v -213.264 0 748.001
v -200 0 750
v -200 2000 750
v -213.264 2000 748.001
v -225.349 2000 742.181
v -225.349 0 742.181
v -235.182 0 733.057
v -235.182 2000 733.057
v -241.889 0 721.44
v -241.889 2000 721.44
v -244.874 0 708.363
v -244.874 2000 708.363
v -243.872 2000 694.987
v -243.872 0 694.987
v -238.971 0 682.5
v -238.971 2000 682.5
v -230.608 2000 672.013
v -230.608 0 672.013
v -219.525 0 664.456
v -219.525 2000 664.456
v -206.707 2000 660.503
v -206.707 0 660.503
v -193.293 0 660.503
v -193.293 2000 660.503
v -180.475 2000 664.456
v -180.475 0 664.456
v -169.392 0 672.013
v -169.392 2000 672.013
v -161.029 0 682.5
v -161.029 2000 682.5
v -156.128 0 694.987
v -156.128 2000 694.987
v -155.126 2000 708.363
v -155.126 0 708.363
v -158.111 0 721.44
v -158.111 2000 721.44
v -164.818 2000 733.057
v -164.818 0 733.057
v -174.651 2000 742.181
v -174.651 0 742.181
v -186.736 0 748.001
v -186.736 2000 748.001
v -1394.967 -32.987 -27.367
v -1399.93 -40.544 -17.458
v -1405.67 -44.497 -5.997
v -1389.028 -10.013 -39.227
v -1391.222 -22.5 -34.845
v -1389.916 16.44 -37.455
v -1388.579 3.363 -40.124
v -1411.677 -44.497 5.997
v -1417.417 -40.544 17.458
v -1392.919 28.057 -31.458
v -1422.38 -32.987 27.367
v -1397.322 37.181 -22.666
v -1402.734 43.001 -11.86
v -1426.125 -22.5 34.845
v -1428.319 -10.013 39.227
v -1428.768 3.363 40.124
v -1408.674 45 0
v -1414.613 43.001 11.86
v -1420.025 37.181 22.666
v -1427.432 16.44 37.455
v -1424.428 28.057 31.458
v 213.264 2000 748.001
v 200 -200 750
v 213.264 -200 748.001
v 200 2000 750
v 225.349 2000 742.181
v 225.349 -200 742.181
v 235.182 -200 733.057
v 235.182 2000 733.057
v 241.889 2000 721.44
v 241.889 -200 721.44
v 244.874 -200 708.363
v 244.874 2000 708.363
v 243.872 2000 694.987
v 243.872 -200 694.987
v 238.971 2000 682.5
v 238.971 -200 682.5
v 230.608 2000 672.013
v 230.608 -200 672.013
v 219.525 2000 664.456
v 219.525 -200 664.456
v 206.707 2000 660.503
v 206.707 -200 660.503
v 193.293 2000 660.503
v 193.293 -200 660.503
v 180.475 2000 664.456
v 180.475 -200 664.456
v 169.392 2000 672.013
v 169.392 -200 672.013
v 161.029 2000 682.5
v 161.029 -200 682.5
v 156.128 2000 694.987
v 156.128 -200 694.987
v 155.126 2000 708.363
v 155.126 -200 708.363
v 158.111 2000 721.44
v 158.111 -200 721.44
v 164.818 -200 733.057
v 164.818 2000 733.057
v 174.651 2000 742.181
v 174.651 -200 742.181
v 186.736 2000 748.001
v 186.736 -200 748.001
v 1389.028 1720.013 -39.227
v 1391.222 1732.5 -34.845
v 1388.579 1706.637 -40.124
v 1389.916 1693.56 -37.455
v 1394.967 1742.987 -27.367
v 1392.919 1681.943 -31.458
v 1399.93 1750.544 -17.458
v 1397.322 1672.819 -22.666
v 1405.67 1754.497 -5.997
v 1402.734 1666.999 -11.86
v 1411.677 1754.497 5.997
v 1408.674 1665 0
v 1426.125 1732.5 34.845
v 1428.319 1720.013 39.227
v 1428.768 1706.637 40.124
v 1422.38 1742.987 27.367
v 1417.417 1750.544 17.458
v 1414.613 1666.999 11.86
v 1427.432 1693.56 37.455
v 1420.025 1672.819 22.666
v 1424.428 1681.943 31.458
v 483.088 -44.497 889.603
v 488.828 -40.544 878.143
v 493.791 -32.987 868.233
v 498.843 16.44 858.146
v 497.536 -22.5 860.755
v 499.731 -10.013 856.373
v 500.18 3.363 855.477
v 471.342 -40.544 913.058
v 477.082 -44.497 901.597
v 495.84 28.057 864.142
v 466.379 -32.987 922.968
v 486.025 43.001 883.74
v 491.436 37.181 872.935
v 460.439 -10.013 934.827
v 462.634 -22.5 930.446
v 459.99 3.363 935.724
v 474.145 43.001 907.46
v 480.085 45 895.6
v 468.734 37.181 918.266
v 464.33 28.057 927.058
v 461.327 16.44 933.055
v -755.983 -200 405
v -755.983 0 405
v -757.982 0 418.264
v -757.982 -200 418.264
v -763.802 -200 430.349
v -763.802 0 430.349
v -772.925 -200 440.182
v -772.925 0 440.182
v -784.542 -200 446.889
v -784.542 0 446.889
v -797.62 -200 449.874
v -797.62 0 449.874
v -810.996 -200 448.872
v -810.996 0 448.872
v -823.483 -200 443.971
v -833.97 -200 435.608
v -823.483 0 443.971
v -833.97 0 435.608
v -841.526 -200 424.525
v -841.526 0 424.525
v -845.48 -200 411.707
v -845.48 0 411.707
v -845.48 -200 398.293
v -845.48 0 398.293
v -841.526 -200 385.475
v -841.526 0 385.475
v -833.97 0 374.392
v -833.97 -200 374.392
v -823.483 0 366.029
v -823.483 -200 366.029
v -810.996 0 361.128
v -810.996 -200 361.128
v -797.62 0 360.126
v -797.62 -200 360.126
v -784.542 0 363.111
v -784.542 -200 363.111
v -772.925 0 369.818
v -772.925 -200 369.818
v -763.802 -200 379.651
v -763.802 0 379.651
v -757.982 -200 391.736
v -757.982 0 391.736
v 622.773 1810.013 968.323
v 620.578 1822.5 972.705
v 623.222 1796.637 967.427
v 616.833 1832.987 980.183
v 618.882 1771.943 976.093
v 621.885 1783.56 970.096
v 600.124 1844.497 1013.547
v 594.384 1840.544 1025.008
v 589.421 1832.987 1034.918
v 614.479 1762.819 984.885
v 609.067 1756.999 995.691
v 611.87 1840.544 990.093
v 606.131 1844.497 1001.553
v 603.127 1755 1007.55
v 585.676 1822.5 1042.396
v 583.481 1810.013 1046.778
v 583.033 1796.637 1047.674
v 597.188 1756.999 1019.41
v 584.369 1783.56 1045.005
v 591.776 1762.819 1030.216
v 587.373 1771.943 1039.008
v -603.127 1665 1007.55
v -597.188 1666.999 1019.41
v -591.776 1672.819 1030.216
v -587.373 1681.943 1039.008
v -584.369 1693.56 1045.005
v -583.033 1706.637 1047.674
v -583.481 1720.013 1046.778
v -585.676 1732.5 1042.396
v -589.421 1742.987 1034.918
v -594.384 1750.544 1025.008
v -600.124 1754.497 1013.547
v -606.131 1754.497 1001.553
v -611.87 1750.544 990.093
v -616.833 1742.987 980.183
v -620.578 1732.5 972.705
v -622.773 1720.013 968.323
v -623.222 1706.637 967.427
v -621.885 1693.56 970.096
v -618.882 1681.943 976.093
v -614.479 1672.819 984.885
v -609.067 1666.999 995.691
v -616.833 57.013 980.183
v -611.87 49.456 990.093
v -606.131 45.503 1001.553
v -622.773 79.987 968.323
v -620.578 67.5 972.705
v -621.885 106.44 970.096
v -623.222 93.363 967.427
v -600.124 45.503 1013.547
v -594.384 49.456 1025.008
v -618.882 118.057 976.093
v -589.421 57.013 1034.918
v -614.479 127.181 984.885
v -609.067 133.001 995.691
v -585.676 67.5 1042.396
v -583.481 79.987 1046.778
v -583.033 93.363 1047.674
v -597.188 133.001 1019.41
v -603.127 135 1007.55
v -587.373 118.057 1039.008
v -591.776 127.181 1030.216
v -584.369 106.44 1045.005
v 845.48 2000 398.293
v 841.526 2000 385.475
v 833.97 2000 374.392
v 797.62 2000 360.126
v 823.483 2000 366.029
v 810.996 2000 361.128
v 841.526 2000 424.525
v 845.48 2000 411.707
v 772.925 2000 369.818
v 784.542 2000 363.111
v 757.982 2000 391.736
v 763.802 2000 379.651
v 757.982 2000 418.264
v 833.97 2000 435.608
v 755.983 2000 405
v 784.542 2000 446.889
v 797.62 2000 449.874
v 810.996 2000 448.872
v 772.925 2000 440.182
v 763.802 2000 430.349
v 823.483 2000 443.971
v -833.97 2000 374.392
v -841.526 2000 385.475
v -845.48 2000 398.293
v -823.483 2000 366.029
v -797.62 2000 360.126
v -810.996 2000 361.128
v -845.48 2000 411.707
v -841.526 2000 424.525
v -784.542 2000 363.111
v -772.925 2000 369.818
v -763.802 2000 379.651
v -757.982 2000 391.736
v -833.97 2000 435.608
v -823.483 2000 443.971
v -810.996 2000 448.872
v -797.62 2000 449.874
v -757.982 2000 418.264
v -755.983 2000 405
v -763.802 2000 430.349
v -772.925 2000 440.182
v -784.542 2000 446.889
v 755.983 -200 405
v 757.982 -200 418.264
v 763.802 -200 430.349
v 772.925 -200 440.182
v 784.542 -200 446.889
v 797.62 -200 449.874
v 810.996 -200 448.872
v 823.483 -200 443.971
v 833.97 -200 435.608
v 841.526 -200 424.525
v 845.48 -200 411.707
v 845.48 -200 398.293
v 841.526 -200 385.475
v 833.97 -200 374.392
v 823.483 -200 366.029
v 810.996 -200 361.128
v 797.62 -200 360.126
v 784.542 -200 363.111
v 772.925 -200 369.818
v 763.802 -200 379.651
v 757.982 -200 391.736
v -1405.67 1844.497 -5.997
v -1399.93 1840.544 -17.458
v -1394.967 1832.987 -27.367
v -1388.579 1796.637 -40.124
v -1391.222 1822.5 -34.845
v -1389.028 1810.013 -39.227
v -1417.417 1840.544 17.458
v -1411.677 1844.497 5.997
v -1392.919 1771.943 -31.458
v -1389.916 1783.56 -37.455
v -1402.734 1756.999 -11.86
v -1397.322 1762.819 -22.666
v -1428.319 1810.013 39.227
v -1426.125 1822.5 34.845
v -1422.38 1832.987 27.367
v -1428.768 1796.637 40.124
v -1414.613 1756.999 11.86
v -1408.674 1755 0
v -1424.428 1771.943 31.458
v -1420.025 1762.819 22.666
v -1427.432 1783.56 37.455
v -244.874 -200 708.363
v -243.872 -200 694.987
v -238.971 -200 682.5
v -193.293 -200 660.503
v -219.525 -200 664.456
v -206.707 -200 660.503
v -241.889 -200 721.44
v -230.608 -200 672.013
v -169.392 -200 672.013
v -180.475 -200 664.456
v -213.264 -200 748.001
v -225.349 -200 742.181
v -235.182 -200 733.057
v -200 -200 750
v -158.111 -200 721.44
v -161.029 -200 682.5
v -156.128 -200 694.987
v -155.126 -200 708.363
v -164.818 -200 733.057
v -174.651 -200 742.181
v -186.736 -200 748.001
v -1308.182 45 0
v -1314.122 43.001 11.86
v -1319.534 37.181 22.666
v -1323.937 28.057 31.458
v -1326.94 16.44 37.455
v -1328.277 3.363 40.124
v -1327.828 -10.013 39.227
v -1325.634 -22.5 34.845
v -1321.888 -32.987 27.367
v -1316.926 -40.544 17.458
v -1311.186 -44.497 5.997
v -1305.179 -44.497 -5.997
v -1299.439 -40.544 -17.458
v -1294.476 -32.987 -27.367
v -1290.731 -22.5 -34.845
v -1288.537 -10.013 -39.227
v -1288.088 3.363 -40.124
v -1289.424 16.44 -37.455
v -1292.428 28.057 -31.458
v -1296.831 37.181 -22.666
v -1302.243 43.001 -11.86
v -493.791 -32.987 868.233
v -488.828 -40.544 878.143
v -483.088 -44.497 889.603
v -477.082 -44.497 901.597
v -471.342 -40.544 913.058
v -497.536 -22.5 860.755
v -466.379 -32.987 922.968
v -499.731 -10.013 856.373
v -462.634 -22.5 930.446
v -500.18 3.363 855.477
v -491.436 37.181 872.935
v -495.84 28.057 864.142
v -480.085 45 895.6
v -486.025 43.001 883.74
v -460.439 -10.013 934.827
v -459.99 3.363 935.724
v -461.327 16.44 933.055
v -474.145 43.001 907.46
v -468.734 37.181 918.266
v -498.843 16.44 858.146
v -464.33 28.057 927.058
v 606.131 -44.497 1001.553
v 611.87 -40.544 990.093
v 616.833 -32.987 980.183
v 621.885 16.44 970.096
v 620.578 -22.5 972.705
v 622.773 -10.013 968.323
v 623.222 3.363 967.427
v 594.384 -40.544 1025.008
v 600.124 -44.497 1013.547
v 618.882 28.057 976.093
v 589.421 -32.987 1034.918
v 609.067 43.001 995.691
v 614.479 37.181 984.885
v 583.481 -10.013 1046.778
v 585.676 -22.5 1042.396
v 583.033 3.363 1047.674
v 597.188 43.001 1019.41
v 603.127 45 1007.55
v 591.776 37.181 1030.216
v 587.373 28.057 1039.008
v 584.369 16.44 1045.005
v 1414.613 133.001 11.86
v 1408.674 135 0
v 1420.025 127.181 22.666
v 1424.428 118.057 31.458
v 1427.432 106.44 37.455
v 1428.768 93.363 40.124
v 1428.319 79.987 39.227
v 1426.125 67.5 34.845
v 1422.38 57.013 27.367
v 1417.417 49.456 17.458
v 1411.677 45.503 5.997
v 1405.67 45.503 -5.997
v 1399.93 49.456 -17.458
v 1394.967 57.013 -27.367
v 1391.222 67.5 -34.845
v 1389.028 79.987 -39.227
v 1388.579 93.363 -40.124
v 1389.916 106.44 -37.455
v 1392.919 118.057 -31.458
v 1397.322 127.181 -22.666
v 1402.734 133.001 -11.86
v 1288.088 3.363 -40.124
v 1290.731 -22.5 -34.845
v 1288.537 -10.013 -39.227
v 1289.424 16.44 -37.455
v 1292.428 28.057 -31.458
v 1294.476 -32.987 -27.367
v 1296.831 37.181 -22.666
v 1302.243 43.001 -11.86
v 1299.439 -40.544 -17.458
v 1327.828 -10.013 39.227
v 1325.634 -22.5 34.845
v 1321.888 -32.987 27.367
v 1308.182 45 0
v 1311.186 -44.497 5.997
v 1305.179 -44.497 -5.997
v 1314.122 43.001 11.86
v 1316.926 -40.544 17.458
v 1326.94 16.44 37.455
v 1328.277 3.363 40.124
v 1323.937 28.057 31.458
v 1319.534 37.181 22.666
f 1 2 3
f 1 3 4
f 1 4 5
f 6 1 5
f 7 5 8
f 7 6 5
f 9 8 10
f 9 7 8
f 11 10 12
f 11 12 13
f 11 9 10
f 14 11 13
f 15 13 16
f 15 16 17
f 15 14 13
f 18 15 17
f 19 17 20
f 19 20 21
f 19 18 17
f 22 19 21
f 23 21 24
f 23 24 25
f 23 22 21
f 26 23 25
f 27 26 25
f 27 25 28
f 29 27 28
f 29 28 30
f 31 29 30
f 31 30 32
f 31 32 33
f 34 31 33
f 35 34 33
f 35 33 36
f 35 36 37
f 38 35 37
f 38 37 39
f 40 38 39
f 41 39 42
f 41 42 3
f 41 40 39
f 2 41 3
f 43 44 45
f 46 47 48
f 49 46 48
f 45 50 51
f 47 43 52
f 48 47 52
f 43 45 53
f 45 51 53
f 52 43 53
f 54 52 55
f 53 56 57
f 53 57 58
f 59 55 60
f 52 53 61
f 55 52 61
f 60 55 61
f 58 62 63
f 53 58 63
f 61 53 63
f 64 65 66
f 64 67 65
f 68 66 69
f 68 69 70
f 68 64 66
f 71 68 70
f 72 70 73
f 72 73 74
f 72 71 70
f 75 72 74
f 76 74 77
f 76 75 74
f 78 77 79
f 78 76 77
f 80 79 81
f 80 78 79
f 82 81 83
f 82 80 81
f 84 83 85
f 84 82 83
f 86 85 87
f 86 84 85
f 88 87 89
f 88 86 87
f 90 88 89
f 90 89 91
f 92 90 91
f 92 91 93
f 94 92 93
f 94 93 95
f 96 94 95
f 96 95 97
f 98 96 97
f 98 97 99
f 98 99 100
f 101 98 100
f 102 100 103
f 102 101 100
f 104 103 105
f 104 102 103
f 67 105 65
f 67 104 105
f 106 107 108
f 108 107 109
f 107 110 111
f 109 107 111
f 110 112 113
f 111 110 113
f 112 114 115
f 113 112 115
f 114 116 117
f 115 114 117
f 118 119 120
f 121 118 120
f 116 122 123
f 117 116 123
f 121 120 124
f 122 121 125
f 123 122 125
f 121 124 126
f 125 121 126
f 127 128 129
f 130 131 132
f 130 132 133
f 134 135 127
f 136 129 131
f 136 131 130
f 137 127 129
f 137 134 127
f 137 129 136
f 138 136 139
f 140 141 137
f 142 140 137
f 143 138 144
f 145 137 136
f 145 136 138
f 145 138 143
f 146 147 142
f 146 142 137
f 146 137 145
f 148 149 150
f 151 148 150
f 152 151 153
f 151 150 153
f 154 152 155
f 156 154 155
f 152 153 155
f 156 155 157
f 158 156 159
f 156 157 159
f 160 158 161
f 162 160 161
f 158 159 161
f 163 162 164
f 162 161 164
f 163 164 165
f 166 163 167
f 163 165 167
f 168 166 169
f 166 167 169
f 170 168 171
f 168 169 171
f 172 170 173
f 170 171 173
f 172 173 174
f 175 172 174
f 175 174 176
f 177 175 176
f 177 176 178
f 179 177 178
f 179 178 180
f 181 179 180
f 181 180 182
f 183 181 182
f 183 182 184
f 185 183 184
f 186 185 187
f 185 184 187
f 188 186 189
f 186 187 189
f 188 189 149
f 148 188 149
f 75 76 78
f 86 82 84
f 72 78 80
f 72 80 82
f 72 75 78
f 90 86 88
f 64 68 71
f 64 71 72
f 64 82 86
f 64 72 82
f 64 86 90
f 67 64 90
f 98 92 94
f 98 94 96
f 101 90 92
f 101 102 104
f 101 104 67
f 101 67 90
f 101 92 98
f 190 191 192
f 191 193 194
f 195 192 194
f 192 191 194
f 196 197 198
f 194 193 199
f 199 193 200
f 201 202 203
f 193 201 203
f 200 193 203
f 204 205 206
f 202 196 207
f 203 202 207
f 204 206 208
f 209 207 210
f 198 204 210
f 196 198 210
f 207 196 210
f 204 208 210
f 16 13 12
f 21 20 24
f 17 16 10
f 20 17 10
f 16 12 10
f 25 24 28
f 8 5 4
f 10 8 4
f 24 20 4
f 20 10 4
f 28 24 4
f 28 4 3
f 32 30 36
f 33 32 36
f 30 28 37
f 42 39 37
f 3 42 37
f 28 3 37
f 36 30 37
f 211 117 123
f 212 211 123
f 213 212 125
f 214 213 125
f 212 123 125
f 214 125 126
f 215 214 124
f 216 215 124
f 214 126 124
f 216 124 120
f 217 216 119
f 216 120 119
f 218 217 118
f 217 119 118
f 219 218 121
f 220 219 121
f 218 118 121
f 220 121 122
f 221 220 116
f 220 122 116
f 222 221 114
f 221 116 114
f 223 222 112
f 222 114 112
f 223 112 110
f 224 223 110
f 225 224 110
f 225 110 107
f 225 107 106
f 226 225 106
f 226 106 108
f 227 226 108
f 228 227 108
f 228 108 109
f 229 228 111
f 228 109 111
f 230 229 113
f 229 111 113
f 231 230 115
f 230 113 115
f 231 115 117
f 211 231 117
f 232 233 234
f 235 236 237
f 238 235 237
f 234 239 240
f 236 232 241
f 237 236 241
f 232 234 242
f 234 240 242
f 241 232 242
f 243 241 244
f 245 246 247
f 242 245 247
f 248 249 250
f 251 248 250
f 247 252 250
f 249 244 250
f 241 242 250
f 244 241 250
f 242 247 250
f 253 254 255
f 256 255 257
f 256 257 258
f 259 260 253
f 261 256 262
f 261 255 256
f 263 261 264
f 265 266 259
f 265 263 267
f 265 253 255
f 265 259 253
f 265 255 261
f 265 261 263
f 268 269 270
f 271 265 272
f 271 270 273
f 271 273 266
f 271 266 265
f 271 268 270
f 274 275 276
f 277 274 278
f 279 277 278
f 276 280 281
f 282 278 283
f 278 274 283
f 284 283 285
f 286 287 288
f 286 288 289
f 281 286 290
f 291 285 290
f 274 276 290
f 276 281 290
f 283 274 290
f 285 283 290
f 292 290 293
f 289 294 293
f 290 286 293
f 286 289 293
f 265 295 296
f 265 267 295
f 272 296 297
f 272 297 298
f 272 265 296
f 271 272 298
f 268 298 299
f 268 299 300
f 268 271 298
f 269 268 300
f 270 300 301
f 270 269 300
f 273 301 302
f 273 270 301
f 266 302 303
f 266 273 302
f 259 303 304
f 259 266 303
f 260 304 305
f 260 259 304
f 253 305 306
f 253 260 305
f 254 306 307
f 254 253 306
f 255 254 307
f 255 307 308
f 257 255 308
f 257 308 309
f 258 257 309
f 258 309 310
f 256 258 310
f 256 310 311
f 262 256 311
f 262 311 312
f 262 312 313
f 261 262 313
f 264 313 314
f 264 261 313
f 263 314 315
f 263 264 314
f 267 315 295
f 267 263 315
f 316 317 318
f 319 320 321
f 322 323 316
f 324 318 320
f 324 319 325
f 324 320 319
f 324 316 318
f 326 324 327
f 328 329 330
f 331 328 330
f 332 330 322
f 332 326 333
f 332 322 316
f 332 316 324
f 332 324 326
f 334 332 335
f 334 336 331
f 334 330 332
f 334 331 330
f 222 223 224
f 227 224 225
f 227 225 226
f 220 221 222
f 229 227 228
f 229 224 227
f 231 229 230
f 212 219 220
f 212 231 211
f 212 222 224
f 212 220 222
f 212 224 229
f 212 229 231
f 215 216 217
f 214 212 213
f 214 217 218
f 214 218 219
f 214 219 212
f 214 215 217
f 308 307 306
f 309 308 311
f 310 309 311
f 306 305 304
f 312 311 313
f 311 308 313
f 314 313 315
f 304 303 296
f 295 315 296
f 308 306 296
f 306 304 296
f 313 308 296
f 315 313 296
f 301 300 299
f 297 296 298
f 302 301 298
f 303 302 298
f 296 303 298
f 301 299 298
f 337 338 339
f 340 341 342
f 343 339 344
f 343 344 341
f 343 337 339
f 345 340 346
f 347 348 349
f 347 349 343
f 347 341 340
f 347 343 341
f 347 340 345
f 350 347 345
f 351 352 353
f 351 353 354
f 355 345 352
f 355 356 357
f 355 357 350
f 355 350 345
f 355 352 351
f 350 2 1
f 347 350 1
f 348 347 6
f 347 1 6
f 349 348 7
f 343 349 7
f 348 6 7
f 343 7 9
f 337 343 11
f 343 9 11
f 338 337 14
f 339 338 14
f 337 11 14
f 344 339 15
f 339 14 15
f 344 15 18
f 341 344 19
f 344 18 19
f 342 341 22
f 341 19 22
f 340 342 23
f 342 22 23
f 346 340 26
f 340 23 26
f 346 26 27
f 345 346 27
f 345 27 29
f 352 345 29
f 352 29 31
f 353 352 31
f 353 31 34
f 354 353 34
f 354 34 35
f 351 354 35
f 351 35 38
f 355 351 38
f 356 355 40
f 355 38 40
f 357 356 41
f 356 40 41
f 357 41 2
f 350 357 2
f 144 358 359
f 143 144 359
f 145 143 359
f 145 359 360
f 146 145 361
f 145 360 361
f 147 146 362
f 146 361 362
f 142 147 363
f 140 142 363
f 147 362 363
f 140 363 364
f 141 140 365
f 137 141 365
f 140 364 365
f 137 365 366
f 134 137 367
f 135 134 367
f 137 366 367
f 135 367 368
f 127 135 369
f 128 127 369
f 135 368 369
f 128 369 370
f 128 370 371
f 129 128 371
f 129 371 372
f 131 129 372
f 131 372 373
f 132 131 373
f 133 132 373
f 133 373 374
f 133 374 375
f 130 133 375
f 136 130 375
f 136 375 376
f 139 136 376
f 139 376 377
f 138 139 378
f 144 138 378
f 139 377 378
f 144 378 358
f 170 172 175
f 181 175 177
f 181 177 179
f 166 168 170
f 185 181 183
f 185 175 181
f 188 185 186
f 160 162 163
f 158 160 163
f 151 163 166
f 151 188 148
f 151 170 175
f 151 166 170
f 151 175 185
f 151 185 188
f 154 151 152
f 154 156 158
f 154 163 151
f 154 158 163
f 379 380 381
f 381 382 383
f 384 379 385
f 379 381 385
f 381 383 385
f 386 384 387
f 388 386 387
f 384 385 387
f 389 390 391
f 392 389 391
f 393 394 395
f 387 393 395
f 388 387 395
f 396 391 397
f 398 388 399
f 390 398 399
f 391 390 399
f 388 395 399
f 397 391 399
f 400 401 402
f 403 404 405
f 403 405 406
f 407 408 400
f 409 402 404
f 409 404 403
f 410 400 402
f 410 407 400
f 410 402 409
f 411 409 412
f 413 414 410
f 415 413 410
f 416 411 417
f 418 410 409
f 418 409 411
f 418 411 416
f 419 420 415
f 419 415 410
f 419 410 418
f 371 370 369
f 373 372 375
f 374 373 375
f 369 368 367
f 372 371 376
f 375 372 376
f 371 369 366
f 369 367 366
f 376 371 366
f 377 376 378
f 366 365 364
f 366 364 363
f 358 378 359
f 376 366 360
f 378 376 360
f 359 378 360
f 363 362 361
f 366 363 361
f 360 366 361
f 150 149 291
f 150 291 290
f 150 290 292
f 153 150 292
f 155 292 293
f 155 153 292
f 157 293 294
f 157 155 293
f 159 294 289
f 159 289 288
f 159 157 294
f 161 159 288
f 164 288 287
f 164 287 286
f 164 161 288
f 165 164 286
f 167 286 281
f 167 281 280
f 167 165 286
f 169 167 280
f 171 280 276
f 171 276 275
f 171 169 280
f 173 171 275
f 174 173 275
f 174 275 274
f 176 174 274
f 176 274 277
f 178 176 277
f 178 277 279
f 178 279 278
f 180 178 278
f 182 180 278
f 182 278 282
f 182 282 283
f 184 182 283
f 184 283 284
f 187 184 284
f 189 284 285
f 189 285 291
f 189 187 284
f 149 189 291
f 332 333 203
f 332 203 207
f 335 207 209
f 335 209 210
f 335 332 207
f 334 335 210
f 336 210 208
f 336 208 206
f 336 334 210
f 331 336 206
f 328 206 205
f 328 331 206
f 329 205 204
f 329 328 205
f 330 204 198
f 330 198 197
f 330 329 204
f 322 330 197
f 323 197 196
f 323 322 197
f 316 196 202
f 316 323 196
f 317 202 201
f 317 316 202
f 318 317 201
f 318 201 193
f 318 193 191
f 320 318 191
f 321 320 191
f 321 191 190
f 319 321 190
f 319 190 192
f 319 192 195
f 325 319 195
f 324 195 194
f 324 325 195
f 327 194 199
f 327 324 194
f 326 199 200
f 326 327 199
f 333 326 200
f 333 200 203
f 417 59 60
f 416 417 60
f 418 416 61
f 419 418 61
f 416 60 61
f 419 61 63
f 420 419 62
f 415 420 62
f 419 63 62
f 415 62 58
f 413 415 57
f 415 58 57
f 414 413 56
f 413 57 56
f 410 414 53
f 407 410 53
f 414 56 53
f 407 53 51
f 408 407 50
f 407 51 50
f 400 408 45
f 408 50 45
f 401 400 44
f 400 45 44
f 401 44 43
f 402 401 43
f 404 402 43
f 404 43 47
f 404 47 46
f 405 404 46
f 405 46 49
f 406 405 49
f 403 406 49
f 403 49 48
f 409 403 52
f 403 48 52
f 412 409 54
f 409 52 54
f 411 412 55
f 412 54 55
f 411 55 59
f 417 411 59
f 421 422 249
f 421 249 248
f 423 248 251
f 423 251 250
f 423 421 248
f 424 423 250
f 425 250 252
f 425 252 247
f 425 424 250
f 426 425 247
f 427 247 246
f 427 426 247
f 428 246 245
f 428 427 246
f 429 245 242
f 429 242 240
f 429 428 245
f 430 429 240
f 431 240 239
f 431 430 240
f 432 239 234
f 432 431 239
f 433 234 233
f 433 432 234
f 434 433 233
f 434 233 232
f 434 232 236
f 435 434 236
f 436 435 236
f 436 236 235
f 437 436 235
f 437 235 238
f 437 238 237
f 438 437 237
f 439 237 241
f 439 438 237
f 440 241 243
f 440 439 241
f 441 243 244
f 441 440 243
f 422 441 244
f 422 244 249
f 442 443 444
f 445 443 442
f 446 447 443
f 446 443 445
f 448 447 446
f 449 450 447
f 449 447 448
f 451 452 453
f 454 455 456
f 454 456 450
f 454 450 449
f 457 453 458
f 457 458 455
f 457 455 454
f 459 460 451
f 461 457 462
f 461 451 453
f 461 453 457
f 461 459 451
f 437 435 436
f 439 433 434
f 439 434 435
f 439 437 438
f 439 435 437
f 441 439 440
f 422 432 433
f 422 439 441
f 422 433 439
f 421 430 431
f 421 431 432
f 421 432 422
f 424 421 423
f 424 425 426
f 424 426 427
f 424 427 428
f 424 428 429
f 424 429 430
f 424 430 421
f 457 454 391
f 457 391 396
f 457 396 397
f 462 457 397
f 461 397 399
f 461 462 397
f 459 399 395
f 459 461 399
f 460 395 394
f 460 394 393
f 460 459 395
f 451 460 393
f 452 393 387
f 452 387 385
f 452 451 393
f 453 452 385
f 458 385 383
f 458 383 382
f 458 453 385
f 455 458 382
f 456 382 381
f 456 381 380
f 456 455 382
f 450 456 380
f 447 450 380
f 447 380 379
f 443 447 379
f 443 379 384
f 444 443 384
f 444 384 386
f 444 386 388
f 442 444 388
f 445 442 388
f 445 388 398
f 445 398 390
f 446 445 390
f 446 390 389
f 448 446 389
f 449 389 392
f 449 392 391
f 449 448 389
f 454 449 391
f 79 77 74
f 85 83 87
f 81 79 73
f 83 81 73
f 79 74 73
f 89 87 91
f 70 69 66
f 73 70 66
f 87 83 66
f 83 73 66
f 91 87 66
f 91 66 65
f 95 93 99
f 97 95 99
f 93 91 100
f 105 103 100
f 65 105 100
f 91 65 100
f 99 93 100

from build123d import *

# Parameters (mm, degrees)
F3_R           = 45
F4_DEPTH       = 2000
F8_R           = 45
F9_DEPTH       = 2250
F11_R          = 45
F12_DEPTH      = 2000
F12_DEPTH_BACK = 200


with BuildPart() as f4:
    # F3 (on line) → F4 (new body)
    with BuildSketch(Plane(origin=(-1045.8591264694, 0, -523.7872847286), x_dir=(0, 1, 0), z_dir=(0.8941336828, 0, 0.447800131))):
        with Locations((0, 585.8042201385)):
            Circle(F3_R)
    extrude(amount=F4_DEPTH)


with BuildPart() as f5_1:
    # F5: instance of F4
    add(f4.part.mirror(Plane.YZ))


with BuildPart() as f9:
    # F8 (on line) → F9 (new body)
    with BuildSketch(Plane(origin=(-1126.199381922, 0, -564.0233004527), x_dir=(0, 1, 0), z_dir=(0.8941336828, 0, 0.447800131))):
        with Locations((0, 630.8042201385)):
            Circle(F8_R)
    extrude(amount=F9_DEPTH)


with BuildPart() as f10_1:
    # F10: instance of F9
    add(f9.part.mirror(Plane.YZ))


with BuildPart() as f12:
    # F11 (on Front) → F12 (new body, two sides)
    with BuildSketch(Plane.XZ) as f12_sk:
        with Locations((-800.9825226983, 405)):
            Circle(F11_R)
    extrude(amount=-F12_DEPTH)
    extrude(f12_sk.sketch, amount=F12_DEPTH_BACK)


with BuildPart() as f12b:
    # F0 (on Front) → F12, piece 2 (new body, two sides)
    with BuildSketch(Plane.XZ) as f12_2_sk:
        with BuildLine():
            ThreePointArc((-200, 660), (-168.1801948466, 673.1801948466), (-155, 705))
            ThreePointArc((-155, 705), (-168.1801948466, 736.8198051534), (-200, 750))
            ThreePointArc((-200, 750), (-245, 705), (-200, 660))
        make_face()
    extrude(amount=-F12_DEPTH)
    extrude(f12_2_sk.sketch, amount=F12_DEPTH_BACK)


with BuildPart() as f10_1_1:
    # F13: moved
    add(f10_1.part.moved(Location((0, 90, 0))))


with BuildPart() as f14_1:
    # F14: instance of F12
    add(f12.part.mirror(Plane.YZ))


with BuildPart() as f14_2:
    # F14: instance of F12b
    add(f12b.part.mirror(Plane.YZ))


with BuildPart() as f17_1:
    # F17: instance of F9
    add(f9.part.mirror(Plane.XZ.offset(-900)))


with BuildPart() as f17_2:
    # F17: instance of F10_1
    add(f10_1_1.part.mirror(Plane.XZ.offset(-900)))


solid = Compound([f4.part, f5_1.part, f9.part, f12.part, f12b.part, f10_1_1.part, f14_1.part, f14_2.part, f17_1.part, f17_2.part])
